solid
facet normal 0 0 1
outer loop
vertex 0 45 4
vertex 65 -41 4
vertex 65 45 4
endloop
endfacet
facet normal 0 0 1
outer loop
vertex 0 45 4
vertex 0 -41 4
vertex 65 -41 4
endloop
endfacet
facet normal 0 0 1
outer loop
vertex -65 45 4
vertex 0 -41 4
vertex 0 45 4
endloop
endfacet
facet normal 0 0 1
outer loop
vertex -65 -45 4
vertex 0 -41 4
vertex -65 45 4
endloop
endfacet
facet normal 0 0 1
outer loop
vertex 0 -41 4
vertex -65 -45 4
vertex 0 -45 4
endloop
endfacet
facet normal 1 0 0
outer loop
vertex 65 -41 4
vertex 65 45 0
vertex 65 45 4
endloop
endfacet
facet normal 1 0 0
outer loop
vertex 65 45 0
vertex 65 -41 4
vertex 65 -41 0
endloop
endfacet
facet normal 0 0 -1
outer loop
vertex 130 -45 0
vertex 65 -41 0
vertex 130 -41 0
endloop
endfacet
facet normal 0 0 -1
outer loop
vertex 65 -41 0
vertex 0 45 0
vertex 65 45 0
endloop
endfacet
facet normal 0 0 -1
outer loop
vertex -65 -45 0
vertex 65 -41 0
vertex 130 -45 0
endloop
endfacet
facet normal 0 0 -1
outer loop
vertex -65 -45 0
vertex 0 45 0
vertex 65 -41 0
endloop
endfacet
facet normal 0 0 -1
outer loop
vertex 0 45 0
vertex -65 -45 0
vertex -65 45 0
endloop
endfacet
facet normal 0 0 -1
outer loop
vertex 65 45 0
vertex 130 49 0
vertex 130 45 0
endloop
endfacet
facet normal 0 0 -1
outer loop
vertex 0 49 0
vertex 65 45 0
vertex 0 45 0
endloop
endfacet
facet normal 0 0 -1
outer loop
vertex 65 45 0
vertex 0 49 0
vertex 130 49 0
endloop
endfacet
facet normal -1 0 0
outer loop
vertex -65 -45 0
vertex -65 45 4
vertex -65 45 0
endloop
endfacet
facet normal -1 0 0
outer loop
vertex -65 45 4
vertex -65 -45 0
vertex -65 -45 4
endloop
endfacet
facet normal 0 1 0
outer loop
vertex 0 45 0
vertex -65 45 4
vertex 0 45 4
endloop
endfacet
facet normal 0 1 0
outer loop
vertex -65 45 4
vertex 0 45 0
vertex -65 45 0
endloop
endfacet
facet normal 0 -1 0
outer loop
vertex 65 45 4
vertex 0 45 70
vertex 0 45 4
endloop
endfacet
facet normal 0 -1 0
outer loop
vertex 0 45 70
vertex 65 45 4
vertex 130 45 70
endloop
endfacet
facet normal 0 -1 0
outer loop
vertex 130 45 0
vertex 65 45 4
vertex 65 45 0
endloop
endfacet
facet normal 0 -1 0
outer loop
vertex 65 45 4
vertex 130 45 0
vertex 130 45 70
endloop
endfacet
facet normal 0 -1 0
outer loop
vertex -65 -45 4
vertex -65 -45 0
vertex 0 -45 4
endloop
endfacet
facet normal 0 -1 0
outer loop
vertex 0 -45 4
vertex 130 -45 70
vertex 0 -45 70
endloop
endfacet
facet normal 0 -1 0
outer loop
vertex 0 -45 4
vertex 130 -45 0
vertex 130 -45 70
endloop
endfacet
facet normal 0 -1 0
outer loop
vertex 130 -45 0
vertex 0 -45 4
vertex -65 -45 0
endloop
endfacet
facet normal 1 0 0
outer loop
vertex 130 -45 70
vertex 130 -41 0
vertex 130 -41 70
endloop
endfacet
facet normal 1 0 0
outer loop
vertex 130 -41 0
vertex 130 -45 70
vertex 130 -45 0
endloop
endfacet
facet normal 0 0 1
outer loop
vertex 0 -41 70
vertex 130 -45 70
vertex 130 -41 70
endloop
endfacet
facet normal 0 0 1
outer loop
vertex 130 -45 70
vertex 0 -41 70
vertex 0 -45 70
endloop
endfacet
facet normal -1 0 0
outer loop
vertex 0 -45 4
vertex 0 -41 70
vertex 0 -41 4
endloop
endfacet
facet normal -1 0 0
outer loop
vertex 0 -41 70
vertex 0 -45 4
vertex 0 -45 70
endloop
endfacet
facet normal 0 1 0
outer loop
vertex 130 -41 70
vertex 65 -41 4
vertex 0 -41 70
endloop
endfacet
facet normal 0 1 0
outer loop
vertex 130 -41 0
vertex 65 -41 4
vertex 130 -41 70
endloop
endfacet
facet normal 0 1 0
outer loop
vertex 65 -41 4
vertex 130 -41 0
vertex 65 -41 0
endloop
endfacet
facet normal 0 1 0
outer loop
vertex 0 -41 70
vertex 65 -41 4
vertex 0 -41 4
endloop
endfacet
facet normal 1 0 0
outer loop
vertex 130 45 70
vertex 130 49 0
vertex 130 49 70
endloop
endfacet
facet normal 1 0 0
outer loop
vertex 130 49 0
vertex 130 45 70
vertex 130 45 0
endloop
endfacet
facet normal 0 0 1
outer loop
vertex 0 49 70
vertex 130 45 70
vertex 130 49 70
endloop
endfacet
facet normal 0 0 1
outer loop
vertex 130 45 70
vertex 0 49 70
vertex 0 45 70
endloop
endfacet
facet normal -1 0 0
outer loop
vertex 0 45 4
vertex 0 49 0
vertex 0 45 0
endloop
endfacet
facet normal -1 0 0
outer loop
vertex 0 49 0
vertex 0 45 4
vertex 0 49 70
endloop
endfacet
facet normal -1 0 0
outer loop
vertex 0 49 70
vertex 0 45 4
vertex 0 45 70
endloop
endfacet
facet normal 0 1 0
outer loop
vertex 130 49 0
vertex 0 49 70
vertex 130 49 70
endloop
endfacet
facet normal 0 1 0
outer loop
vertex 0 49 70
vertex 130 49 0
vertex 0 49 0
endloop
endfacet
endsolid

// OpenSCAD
// Dimensions for the Falcon tube rack
$fn = 64; // Ensure smooth curves

// Plate dimensions
plate_length_X = 130;   // mm
plate_width_Y = 90;         // mm
plate_thickness_Z = 4;        // mm

// Hole dimensions
hole_diameter = 30.5;       // mm
hole_spacing_X = 40;          // mm between centres (along X)
hole_spacing_Y = 40;          // mm between centres (along Y)

// Wall dimensions
wall_length_X = plate_length_X;   // 130 mm
wall_thickness_Y = 4;             // mm (along Y)
wall_height_Z = 70;                 // mm (up from plate)

// The part must rest on the bed at z = 0, so the entire base must be at z >= 0
// The original design had the plate centred at z = 0, so it extended from z = -2 to z = +2
// We need to shift the entire model so that the bottom of the plate is at z = 0

// Adjust: move the entire model up by 2 mm so that the plate's bottom is at z = 0
// The plate now spans from z = 0 to z = 4 (its thickness), and the walls start at z = 0

// Start with the base plate, now shifted so bottom is at z = 0
module base_plate() {
    translate([0, 0, 2]) // Shift up by 2 mm so bottom is at z = 0
    cube([plate_length_X, plate_width_Y, plate_thickness_Z], center = true);
}

// Create the six through-holes, also shifted up by 2 mm
module holes() {
    for (i = [0:2]) {
        for (j = [0:1]) {
            // Calculate X and Y positions: 3 columns (i=0,1,2), 2 rows (j=0,1)
            x_pos = plate_length_X / 2 - hole_spacing_X + i * hole_spacing_X;
            y_pos = plate_width_Y / 2 - hole_spacing_Y/2 + j * hole_spacing_Y;

            // Cut hole through the plate: extend slightly beyond to ensure clean cut
            // The hole should go through the full thickness of the plate (4 mm), from z = 0 to z = 4
            // So we place the cylinder from z = -0.1 to z = 4.1 to ensure full penetration
            translate([x_pos, y_pos, 1.9]) // Center of cylinder at z = 2 (middle of plate), extend 2.1 mm above and below
            cylinder(h = 4.2, d = hole_diameter, center = true);
        }
    }
}

// Create the two walls along the long edges (along X)
// Each wall is 130 mm long (X), 4 mm thick (Y), and rises from z = 0 to z = 70
// They are flush with the plate's long edge (Y = ±plate_width_Y/2), so we place them at Y = ±45 mm
// The wall extends from z = 0 to z = 70, so we use cube with bottom at z = 0

module walls() {
    // Wall 1: at Y = -plate_width_Y/2 = -45 mm
    translate([0, -45, 0])
    cube([wall_length_X, wall_thickness_Y, wall_height_Z], center = false);

    // Wall 2: at Y = +plate_width_Y/2 = +45 mm
    translate([0, +45, 0])
    cube([wall_length_X, wall_thickness_Y, wall_height_Z], center = false);
}

// Assemble the rack: base plate + holes + walls
difference() {
    base_plate();
    holes();
}

// Add walls on top of the plate (they are solid and separate from the plate)
// Use union to attach walls to the plate
union() {
    base_plate();
    walls();
}
